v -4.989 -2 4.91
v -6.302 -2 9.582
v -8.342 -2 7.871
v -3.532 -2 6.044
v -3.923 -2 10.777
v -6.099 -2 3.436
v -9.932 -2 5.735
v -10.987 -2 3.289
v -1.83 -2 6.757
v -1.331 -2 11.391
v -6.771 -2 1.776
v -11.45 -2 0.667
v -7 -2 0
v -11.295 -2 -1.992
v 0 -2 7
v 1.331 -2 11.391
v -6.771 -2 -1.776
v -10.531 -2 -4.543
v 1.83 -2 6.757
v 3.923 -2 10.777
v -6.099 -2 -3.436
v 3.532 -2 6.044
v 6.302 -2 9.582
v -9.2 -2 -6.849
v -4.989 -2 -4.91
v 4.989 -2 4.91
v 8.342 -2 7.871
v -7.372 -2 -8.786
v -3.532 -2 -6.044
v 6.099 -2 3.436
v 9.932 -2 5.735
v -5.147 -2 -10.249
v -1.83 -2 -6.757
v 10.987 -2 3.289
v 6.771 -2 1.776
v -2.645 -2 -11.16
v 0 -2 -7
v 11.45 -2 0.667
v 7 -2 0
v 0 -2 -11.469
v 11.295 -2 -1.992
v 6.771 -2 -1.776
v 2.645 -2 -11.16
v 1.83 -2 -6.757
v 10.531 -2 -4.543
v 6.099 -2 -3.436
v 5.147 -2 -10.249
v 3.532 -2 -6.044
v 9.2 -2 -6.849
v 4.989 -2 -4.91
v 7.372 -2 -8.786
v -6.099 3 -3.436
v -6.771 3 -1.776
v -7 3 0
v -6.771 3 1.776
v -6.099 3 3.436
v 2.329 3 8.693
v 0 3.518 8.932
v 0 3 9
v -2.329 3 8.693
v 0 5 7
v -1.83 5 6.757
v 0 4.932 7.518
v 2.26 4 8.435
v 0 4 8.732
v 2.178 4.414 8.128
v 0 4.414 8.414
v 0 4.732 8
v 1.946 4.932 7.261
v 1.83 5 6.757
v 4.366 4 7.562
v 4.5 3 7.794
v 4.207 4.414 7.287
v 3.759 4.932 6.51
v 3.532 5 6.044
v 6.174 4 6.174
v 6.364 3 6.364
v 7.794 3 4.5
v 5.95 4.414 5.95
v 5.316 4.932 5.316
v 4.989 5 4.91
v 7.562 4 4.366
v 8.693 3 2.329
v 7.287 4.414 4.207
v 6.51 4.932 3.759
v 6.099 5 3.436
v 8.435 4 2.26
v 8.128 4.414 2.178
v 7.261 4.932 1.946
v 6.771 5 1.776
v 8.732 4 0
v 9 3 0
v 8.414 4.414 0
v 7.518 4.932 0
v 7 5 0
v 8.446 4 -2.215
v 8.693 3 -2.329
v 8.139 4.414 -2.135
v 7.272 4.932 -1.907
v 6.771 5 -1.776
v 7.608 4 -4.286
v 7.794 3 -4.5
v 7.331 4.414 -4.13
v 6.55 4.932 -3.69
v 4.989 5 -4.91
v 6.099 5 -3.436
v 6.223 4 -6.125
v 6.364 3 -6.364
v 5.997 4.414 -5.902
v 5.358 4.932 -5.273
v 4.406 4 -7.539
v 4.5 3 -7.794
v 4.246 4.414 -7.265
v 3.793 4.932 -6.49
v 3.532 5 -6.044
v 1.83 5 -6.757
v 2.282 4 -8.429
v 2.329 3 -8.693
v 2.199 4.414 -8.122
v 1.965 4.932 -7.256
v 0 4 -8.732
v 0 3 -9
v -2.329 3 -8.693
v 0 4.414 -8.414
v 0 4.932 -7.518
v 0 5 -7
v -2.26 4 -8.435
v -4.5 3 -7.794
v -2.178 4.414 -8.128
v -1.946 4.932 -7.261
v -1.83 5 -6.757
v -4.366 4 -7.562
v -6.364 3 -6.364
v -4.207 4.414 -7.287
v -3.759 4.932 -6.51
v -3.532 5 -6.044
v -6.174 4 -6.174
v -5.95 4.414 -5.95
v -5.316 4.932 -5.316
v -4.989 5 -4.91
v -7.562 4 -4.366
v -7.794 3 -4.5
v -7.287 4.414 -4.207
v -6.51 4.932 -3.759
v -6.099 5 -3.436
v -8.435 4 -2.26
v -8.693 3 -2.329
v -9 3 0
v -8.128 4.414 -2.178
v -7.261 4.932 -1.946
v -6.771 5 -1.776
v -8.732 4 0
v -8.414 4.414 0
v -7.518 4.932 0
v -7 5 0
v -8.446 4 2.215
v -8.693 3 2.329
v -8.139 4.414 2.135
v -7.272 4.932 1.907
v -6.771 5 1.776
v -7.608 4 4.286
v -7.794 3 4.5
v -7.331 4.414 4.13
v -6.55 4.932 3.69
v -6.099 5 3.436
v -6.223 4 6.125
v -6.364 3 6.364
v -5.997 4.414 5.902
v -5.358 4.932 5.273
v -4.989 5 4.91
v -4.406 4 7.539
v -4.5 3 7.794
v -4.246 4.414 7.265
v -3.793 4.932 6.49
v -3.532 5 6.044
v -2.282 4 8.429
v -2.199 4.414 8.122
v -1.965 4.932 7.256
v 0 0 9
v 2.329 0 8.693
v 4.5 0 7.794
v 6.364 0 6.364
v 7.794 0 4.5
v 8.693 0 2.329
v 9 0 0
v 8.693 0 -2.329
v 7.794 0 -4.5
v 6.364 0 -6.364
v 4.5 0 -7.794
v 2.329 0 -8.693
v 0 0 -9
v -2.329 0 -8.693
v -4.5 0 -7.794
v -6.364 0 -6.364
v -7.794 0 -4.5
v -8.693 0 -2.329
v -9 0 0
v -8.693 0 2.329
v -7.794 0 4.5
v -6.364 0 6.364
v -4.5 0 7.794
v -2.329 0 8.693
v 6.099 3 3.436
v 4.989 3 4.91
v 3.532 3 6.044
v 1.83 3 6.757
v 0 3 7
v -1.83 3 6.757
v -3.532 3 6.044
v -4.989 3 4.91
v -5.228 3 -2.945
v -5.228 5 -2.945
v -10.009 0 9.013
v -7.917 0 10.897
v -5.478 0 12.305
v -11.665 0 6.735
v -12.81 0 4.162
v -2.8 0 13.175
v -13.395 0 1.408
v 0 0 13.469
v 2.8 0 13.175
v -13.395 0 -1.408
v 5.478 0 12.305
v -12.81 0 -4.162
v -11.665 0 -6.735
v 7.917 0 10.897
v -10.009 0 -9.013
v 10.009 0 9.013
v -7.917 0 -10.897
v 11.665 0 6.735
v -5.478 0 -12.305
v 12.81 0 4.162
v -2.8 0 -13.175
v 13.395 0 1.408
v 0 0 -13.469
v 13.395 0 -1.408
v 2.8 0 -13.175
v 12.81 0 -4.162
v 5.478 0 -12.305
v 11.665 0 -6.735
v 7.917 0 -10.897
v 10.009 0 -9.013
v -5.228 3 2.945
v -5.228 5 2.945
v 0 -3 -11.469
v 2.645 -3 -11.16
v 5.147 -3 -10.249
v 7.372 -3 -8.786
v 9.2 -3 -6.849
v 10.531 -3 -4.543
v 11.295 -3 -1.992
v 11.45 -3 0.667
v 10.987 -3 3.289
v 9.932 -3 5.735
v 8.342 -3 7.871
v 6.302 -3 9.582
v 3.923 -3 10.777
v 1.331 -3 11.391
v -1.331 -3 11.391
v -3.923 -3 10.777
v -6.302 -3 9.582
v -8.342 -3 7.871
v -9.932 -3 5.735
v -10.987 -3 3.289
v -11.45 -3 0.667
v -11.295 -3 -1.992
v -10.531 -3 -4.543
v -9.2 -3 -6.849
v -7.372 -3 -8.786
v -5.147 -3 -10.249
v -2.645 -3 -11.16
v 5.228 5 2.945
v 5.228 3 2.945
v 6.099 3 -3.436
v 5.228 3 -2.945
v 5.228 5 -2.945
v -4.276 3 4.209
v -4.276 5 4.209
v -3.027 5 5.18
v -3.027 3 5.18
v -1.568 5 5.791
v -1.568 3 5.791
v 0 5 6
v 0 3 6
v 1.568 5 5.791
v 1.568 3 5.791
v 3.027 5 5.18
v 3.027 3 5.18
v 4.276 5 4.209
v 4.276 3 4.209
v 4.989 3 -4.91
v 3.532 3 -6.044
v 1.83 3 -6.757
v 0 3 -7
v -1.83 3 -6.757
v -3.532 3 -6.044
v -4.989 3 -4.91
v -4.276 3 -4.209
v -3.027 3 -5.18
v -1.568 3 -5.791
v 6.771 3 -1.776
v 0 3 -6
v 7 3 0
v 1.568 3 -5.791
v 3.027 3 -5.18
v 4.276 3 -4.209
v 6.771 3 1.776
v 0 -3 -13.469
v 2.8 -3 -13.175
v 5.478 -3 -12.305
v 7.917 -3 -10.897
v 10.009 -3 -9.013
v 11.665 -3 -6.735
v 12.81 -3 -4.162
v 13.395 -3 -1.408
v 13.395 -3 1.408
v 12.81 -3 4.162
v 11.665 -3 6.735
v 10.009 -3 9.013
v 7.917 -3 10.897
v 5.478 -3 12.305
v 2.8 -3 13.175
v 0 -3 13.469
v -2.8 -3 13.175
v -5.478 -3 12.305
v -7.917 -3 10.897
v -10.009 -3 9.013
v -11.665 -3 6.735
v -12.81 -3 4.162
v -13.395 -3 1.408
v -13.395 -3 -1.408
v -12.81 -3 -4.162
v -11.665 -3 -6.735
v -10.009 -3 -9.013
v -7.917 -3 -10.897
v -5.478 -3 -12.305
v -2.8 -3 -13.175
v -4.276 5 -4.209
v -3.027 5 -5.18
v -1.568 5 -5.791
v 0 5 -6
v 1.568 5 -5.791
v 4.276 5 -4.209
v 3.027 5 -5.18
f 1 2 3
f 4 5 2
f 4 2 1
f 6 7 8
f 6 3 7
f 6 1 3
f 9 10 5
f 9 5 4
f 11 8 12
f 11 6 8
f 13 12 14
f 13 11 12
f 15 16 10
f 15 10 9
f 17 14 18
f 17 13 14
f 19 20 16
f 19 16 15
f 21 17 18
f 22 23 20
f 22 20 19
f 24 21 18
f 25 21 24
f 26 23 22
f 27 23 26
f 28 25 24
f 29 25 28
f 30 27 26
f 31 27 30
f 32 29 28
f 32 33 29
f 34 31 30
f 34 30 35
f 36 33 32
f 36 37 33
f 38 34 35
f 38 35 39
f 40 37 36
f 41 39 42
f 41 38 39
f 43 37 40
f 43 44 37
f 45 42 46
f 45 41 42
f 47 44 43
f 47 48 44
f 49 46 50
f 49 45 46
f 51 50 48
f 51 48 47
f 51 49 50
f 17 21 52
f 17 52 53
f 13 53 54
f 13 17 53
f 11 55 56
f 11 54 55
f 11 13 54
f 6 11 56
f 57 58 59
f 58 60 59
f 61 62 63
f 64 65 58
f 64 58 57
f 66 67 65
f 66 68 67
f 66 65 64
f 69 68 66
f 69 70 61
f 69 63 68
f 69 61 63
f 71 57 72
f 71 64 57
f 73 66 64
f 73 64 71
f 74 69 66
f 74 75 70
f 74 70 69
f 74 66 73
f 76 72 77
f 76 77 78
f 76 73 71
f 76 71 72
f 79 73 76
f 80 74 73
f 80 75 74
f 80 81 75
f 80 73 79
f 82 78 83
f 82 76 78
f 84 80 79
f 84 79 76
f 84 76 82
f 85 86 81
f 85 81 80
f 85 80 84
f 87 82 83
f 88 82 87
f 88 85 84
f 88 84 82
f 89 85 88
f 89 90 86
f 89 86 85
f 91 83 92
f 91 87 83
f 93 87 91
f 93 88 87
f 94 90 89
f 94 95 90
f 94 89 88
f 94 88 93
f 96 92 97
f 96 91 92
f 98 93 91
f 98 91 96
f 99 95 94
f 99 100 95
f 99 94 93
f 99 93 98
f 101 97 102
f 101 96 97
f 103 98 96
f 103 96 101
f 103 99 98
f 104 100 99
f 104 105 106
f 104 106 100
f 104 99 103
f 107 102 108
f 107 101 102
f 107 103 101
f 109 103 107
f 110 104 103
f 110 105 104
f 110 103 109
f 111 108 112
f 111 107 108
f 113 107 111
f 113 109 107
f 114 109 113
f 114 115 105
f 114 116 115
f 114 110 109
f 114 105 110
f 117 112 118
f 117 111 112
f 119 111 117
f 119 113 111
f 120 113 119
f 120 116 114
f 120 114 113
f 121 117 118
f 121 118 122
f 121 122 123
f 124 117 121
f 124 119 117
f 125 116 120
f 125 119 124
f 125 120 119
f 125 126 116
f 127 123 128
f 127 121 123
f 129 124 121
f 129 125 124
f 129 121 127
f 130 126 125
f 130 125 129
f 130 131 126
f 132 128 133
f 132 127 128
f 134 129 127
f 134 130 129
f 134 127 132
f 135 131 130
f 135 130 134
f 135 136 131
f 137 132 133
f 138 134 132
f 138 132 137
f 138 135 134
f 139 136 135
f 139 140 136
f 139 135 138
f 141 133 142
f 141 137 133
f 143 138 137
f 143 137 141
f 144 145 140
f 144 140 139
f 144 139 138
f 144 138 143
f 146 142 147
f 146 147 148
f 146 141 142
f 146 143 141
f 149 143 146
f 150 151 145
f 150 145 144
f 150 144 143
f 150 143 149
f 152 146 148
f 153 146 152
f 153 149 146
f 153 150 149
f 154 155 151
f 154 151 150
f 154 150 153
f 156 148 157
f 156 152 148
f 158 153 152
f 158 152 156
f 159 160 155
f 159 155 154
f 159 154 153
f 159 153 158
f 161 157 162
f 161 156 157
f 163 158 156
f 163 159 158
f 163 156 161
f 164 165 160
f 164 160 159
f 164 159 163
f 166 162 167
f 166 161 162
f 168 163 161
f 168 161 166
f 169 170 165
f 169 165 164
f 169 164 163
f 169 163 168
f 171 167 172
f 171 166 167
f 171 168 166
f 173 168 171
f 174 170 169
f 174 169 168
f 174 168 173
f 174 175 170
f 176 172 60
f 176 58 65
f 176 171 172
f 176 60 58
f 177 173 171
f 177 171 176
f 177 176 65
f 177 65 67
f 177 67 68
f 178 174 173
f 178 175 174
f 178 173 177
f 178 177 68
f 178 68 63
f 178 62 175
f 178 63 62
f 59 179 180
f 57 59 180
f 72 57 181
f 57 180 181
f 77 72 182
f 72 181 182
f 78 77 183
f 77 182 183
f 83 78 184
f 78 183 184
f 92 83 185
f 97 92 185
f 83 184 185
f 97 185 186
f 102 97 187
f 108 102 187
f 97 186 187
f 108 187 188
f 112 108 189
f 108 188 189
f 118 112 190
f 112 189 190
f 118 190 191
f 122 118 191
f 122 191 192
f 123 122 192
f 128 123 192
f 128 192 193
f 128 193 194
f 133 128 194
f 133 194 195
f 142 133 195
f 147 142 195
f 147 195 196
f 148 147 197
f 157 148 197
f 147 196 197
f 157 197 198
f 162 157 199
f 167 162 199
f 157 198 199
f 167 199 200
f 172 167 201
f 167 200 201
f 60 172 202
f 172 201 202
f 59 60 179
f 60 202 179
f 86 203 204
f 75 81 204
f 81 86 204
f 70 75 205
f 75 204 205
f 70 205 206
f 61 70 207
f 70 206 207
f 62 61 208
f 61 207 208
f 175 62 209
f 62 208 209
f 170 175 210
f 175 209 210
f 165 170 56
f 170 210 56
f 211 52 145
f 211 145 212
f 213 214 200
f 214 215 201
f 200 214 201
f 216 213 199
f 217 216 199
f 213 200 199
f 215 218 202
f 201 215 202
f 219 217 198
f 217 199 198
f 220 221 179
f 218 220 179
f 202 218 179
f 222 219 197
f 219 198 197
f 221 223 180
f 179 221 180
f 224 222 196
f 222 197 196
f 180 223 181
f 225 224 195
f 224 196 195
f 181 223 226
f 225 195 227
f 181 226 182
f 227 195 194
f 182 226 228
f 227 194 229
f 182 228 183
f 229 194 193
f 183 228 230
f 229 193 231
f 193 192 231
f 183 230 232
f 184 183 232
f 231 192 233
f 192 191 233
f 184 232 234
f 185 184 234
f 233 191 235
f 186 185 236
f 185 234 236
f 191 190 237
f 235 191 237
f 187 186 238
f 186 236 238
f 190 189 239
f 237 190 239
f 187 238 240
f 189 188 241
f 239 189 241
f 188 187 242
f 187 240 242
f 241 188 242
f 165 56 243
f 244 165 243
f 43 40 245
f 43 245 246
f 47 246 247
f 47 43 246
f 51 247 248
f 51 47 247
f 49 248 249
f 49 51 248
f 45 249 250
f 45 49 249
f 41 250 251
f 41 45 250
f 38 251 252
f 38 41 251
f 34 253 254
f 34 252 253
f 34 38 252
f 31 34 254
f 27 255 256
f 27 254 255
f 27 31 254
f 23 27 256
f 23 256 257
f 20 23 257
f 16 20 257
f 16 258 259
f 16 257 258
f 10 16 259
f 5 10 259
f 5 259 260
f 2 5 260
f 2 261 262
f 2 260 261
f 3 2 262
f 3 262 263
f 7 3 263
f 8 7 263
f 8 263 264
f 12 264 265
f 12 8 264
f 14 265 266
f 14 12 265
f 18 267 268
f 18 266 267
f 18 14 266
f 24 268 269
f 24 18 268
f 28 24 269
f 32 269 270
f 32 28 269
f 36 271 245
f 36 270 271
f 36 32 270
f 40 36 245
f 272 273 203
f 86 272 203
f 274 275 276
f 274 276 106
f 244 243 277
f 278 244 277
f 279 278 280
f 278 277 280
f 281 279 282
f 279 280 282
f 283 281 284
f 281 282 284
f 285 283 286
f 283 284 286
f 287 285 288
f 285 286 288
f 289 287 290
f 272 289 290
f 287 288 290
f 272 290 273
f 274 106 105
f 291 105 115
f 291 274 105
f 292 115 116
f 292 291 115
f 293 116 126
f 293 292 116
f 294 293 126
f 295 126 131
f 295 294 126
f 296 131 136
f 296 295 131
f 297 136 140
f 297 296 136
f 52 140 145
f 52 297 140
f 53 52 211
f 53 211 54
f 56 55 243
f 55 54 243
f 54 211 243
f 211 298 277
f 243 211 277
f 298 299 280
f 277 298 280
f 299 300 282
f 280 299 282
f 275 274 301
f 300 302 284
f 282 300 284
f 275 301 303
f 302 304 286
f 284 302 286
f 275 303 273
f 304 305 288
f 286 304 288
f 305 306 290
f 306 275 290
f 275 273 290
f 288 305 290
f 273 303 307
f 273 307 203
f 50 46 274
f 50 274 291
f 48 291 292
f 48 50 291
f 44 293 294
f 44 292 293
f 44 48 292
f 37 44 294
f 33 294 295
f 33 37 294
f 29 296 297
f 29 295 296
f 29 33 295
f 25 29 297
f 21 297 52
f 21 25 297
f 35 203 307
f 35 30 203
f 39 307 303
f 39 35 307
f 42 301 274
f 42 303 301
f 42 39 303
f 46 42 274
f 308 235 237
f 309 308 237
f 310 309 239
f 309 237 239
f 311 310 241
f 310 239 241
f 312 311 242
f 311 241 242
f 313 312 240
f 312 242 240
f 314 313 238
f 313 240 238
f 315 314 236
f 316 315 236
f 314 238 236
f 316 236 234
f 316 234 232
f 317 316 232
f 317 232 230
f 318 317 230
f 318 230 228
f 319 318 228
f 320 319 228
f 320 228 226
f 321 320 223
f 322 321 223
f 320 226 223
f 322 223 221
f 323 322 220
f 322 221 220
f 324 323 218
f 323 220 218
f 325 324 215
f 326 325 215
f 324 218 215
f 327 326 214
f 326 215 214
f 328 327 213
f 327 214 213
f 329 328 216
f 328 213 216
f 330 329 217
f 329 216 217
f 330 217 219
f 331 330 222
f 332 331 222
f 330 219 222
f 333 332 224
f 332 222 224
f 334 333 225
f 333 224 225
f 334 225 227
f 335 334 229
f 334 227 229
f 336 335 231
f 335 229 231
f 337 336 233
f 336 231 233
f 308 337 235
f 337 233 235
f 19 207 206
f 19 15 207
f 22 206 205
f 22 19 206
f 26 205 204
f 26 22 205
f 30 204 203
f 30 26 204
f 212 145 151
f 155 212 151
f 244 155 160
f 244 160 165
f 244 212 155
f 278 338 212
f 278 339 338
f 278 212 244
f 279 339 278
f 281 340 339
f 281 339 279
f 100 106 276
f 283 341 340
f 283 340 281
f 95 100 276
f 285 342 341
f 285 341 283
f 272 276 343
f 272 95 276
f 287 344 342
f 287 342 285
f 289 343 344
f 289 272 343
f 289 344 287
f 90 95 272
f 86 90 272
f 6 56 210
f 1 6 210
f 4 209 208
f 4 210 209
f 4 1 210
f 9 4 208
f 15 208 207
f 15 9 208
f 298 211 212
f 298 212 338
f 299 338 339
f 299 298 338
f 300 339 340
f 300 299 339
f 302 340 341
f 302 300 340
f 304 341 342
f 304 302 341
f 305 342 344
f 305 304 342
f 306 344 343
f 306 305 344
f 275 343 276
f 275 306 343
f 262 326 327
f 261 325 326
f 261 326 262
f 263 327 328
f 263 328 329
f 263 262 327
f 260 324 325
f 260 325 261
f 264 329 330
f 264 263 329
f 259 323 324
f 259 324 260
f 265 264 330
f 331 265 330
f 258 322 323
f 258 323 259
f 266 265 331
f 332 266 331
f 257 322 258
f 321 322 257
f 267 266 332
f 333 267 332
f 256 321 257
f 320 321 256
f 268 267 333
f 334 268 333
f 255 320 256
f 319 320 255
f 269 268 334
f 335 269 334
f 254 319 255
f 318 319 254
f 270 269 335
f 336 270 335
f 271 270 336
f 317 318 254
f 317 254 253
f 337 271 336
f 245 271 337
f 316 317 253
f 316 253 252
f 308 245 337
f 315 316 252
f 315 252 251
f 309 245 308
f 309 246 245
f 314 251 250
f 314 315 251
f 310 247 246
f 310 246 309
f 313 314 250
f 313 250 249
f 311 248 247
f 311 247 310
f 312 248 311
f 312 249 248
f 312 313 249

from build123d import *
from build123d.topology import SkipClean

# Parameters (mm, degrees)
SKETCH1_R           = 9
BOSS_EXTRUDE1_DEPTH = 5
SKETCH2_R           = 13.469028944
BOSS_EXTRUDE2_DEPTH = 3
SHELL1_T            = -2
FILLET1_R           = 2
CUT_EXTRUDE1_START  = -13
CUT_EXTRUDE1_DEPTH  = 13


with BuildPart() as part:
    # Sketch1 → Boss-Extrude1 (new body)
    with BuildSketch(Plane(origin=(0, 0, 0), x_dir=(1, 0, 0), z_dir=(0, 1, 0))):
        with Locations(Location((0, 0, 0), (0, 0, 270))):
            Circle(SKETCH1_R)
    extrude(amount=BOSS_EXTRUDE1_DEPTH)

    # Sketch2 → Boss-Extrude2 (add)
    with BuildSketch(Plane.XZ):
        with Locations(Location((0, 0, 0), (0, 0, 270))):
            Circle(SKETCH2_R)
    extrude(amount=BOSS_EXTRUDE2_DEPTH)

    # Shell1
    shell1_openings = [part.faces().sort_by_distance(p)[0] for p in [
        (0, -3, 0),
    ]]
    offset(amount=SHELL1_T, openings=shell1_openings, kind=Kind.INTERSECTION)

    # Fillet1
    fillet1_edges = [part.edges().sort_by_distance(p)[0] for p in [
        (0, 5, -9),
    ]]
    fillet(fillet1_edges, radius=FILLET1_R)

    # Sketch3 → Cut-Extrude1 (cut)
    with SkipClean():  # the faces are left unmerged after this step: merging them gives an invalid solid
        with BuildSketch(Plane(origin=(0, 5, 0), x_dir=(1, 0, 0), z_dir=(0, 1, 0)).offset(CUT_EXTRUDE1_START)):
            with BuildLine():
                Line((5.227613876, -2.944834998), (6.098882855, -3.435640831))
                ThreePointArc((6.098882855, -3.435640831), (0, -7), (-6.098882855, -3.435640831))
                Line((-6.098882855, -3.435640831), (-5.227613876, -2.944834998))
                ThreePointArc((-5.227613876, -2.944834998), (0, -6), (5.227613876, -2.944834998))
            make_face()
            with BuildLine():
                Line((5.227613876, 2.944834998), (6.098882855, 3.435640831))
                ThreePointArc((6.098882855, 3.435640831), (0, 7), (-6.098882855, 3.435640831))
                Line((-6.098882855, 3.435640831), (-5.227613876, 2.944834998))
                ThreePointArc((-5.227613876, 2.944834998), (0, 6), (5.227613876, 2.944834998))
            make_face()
        extrude(amount=CUT_EXTRUDE1_DEPTH, mode=Mode.SUBTRACT)


solid = part.part
